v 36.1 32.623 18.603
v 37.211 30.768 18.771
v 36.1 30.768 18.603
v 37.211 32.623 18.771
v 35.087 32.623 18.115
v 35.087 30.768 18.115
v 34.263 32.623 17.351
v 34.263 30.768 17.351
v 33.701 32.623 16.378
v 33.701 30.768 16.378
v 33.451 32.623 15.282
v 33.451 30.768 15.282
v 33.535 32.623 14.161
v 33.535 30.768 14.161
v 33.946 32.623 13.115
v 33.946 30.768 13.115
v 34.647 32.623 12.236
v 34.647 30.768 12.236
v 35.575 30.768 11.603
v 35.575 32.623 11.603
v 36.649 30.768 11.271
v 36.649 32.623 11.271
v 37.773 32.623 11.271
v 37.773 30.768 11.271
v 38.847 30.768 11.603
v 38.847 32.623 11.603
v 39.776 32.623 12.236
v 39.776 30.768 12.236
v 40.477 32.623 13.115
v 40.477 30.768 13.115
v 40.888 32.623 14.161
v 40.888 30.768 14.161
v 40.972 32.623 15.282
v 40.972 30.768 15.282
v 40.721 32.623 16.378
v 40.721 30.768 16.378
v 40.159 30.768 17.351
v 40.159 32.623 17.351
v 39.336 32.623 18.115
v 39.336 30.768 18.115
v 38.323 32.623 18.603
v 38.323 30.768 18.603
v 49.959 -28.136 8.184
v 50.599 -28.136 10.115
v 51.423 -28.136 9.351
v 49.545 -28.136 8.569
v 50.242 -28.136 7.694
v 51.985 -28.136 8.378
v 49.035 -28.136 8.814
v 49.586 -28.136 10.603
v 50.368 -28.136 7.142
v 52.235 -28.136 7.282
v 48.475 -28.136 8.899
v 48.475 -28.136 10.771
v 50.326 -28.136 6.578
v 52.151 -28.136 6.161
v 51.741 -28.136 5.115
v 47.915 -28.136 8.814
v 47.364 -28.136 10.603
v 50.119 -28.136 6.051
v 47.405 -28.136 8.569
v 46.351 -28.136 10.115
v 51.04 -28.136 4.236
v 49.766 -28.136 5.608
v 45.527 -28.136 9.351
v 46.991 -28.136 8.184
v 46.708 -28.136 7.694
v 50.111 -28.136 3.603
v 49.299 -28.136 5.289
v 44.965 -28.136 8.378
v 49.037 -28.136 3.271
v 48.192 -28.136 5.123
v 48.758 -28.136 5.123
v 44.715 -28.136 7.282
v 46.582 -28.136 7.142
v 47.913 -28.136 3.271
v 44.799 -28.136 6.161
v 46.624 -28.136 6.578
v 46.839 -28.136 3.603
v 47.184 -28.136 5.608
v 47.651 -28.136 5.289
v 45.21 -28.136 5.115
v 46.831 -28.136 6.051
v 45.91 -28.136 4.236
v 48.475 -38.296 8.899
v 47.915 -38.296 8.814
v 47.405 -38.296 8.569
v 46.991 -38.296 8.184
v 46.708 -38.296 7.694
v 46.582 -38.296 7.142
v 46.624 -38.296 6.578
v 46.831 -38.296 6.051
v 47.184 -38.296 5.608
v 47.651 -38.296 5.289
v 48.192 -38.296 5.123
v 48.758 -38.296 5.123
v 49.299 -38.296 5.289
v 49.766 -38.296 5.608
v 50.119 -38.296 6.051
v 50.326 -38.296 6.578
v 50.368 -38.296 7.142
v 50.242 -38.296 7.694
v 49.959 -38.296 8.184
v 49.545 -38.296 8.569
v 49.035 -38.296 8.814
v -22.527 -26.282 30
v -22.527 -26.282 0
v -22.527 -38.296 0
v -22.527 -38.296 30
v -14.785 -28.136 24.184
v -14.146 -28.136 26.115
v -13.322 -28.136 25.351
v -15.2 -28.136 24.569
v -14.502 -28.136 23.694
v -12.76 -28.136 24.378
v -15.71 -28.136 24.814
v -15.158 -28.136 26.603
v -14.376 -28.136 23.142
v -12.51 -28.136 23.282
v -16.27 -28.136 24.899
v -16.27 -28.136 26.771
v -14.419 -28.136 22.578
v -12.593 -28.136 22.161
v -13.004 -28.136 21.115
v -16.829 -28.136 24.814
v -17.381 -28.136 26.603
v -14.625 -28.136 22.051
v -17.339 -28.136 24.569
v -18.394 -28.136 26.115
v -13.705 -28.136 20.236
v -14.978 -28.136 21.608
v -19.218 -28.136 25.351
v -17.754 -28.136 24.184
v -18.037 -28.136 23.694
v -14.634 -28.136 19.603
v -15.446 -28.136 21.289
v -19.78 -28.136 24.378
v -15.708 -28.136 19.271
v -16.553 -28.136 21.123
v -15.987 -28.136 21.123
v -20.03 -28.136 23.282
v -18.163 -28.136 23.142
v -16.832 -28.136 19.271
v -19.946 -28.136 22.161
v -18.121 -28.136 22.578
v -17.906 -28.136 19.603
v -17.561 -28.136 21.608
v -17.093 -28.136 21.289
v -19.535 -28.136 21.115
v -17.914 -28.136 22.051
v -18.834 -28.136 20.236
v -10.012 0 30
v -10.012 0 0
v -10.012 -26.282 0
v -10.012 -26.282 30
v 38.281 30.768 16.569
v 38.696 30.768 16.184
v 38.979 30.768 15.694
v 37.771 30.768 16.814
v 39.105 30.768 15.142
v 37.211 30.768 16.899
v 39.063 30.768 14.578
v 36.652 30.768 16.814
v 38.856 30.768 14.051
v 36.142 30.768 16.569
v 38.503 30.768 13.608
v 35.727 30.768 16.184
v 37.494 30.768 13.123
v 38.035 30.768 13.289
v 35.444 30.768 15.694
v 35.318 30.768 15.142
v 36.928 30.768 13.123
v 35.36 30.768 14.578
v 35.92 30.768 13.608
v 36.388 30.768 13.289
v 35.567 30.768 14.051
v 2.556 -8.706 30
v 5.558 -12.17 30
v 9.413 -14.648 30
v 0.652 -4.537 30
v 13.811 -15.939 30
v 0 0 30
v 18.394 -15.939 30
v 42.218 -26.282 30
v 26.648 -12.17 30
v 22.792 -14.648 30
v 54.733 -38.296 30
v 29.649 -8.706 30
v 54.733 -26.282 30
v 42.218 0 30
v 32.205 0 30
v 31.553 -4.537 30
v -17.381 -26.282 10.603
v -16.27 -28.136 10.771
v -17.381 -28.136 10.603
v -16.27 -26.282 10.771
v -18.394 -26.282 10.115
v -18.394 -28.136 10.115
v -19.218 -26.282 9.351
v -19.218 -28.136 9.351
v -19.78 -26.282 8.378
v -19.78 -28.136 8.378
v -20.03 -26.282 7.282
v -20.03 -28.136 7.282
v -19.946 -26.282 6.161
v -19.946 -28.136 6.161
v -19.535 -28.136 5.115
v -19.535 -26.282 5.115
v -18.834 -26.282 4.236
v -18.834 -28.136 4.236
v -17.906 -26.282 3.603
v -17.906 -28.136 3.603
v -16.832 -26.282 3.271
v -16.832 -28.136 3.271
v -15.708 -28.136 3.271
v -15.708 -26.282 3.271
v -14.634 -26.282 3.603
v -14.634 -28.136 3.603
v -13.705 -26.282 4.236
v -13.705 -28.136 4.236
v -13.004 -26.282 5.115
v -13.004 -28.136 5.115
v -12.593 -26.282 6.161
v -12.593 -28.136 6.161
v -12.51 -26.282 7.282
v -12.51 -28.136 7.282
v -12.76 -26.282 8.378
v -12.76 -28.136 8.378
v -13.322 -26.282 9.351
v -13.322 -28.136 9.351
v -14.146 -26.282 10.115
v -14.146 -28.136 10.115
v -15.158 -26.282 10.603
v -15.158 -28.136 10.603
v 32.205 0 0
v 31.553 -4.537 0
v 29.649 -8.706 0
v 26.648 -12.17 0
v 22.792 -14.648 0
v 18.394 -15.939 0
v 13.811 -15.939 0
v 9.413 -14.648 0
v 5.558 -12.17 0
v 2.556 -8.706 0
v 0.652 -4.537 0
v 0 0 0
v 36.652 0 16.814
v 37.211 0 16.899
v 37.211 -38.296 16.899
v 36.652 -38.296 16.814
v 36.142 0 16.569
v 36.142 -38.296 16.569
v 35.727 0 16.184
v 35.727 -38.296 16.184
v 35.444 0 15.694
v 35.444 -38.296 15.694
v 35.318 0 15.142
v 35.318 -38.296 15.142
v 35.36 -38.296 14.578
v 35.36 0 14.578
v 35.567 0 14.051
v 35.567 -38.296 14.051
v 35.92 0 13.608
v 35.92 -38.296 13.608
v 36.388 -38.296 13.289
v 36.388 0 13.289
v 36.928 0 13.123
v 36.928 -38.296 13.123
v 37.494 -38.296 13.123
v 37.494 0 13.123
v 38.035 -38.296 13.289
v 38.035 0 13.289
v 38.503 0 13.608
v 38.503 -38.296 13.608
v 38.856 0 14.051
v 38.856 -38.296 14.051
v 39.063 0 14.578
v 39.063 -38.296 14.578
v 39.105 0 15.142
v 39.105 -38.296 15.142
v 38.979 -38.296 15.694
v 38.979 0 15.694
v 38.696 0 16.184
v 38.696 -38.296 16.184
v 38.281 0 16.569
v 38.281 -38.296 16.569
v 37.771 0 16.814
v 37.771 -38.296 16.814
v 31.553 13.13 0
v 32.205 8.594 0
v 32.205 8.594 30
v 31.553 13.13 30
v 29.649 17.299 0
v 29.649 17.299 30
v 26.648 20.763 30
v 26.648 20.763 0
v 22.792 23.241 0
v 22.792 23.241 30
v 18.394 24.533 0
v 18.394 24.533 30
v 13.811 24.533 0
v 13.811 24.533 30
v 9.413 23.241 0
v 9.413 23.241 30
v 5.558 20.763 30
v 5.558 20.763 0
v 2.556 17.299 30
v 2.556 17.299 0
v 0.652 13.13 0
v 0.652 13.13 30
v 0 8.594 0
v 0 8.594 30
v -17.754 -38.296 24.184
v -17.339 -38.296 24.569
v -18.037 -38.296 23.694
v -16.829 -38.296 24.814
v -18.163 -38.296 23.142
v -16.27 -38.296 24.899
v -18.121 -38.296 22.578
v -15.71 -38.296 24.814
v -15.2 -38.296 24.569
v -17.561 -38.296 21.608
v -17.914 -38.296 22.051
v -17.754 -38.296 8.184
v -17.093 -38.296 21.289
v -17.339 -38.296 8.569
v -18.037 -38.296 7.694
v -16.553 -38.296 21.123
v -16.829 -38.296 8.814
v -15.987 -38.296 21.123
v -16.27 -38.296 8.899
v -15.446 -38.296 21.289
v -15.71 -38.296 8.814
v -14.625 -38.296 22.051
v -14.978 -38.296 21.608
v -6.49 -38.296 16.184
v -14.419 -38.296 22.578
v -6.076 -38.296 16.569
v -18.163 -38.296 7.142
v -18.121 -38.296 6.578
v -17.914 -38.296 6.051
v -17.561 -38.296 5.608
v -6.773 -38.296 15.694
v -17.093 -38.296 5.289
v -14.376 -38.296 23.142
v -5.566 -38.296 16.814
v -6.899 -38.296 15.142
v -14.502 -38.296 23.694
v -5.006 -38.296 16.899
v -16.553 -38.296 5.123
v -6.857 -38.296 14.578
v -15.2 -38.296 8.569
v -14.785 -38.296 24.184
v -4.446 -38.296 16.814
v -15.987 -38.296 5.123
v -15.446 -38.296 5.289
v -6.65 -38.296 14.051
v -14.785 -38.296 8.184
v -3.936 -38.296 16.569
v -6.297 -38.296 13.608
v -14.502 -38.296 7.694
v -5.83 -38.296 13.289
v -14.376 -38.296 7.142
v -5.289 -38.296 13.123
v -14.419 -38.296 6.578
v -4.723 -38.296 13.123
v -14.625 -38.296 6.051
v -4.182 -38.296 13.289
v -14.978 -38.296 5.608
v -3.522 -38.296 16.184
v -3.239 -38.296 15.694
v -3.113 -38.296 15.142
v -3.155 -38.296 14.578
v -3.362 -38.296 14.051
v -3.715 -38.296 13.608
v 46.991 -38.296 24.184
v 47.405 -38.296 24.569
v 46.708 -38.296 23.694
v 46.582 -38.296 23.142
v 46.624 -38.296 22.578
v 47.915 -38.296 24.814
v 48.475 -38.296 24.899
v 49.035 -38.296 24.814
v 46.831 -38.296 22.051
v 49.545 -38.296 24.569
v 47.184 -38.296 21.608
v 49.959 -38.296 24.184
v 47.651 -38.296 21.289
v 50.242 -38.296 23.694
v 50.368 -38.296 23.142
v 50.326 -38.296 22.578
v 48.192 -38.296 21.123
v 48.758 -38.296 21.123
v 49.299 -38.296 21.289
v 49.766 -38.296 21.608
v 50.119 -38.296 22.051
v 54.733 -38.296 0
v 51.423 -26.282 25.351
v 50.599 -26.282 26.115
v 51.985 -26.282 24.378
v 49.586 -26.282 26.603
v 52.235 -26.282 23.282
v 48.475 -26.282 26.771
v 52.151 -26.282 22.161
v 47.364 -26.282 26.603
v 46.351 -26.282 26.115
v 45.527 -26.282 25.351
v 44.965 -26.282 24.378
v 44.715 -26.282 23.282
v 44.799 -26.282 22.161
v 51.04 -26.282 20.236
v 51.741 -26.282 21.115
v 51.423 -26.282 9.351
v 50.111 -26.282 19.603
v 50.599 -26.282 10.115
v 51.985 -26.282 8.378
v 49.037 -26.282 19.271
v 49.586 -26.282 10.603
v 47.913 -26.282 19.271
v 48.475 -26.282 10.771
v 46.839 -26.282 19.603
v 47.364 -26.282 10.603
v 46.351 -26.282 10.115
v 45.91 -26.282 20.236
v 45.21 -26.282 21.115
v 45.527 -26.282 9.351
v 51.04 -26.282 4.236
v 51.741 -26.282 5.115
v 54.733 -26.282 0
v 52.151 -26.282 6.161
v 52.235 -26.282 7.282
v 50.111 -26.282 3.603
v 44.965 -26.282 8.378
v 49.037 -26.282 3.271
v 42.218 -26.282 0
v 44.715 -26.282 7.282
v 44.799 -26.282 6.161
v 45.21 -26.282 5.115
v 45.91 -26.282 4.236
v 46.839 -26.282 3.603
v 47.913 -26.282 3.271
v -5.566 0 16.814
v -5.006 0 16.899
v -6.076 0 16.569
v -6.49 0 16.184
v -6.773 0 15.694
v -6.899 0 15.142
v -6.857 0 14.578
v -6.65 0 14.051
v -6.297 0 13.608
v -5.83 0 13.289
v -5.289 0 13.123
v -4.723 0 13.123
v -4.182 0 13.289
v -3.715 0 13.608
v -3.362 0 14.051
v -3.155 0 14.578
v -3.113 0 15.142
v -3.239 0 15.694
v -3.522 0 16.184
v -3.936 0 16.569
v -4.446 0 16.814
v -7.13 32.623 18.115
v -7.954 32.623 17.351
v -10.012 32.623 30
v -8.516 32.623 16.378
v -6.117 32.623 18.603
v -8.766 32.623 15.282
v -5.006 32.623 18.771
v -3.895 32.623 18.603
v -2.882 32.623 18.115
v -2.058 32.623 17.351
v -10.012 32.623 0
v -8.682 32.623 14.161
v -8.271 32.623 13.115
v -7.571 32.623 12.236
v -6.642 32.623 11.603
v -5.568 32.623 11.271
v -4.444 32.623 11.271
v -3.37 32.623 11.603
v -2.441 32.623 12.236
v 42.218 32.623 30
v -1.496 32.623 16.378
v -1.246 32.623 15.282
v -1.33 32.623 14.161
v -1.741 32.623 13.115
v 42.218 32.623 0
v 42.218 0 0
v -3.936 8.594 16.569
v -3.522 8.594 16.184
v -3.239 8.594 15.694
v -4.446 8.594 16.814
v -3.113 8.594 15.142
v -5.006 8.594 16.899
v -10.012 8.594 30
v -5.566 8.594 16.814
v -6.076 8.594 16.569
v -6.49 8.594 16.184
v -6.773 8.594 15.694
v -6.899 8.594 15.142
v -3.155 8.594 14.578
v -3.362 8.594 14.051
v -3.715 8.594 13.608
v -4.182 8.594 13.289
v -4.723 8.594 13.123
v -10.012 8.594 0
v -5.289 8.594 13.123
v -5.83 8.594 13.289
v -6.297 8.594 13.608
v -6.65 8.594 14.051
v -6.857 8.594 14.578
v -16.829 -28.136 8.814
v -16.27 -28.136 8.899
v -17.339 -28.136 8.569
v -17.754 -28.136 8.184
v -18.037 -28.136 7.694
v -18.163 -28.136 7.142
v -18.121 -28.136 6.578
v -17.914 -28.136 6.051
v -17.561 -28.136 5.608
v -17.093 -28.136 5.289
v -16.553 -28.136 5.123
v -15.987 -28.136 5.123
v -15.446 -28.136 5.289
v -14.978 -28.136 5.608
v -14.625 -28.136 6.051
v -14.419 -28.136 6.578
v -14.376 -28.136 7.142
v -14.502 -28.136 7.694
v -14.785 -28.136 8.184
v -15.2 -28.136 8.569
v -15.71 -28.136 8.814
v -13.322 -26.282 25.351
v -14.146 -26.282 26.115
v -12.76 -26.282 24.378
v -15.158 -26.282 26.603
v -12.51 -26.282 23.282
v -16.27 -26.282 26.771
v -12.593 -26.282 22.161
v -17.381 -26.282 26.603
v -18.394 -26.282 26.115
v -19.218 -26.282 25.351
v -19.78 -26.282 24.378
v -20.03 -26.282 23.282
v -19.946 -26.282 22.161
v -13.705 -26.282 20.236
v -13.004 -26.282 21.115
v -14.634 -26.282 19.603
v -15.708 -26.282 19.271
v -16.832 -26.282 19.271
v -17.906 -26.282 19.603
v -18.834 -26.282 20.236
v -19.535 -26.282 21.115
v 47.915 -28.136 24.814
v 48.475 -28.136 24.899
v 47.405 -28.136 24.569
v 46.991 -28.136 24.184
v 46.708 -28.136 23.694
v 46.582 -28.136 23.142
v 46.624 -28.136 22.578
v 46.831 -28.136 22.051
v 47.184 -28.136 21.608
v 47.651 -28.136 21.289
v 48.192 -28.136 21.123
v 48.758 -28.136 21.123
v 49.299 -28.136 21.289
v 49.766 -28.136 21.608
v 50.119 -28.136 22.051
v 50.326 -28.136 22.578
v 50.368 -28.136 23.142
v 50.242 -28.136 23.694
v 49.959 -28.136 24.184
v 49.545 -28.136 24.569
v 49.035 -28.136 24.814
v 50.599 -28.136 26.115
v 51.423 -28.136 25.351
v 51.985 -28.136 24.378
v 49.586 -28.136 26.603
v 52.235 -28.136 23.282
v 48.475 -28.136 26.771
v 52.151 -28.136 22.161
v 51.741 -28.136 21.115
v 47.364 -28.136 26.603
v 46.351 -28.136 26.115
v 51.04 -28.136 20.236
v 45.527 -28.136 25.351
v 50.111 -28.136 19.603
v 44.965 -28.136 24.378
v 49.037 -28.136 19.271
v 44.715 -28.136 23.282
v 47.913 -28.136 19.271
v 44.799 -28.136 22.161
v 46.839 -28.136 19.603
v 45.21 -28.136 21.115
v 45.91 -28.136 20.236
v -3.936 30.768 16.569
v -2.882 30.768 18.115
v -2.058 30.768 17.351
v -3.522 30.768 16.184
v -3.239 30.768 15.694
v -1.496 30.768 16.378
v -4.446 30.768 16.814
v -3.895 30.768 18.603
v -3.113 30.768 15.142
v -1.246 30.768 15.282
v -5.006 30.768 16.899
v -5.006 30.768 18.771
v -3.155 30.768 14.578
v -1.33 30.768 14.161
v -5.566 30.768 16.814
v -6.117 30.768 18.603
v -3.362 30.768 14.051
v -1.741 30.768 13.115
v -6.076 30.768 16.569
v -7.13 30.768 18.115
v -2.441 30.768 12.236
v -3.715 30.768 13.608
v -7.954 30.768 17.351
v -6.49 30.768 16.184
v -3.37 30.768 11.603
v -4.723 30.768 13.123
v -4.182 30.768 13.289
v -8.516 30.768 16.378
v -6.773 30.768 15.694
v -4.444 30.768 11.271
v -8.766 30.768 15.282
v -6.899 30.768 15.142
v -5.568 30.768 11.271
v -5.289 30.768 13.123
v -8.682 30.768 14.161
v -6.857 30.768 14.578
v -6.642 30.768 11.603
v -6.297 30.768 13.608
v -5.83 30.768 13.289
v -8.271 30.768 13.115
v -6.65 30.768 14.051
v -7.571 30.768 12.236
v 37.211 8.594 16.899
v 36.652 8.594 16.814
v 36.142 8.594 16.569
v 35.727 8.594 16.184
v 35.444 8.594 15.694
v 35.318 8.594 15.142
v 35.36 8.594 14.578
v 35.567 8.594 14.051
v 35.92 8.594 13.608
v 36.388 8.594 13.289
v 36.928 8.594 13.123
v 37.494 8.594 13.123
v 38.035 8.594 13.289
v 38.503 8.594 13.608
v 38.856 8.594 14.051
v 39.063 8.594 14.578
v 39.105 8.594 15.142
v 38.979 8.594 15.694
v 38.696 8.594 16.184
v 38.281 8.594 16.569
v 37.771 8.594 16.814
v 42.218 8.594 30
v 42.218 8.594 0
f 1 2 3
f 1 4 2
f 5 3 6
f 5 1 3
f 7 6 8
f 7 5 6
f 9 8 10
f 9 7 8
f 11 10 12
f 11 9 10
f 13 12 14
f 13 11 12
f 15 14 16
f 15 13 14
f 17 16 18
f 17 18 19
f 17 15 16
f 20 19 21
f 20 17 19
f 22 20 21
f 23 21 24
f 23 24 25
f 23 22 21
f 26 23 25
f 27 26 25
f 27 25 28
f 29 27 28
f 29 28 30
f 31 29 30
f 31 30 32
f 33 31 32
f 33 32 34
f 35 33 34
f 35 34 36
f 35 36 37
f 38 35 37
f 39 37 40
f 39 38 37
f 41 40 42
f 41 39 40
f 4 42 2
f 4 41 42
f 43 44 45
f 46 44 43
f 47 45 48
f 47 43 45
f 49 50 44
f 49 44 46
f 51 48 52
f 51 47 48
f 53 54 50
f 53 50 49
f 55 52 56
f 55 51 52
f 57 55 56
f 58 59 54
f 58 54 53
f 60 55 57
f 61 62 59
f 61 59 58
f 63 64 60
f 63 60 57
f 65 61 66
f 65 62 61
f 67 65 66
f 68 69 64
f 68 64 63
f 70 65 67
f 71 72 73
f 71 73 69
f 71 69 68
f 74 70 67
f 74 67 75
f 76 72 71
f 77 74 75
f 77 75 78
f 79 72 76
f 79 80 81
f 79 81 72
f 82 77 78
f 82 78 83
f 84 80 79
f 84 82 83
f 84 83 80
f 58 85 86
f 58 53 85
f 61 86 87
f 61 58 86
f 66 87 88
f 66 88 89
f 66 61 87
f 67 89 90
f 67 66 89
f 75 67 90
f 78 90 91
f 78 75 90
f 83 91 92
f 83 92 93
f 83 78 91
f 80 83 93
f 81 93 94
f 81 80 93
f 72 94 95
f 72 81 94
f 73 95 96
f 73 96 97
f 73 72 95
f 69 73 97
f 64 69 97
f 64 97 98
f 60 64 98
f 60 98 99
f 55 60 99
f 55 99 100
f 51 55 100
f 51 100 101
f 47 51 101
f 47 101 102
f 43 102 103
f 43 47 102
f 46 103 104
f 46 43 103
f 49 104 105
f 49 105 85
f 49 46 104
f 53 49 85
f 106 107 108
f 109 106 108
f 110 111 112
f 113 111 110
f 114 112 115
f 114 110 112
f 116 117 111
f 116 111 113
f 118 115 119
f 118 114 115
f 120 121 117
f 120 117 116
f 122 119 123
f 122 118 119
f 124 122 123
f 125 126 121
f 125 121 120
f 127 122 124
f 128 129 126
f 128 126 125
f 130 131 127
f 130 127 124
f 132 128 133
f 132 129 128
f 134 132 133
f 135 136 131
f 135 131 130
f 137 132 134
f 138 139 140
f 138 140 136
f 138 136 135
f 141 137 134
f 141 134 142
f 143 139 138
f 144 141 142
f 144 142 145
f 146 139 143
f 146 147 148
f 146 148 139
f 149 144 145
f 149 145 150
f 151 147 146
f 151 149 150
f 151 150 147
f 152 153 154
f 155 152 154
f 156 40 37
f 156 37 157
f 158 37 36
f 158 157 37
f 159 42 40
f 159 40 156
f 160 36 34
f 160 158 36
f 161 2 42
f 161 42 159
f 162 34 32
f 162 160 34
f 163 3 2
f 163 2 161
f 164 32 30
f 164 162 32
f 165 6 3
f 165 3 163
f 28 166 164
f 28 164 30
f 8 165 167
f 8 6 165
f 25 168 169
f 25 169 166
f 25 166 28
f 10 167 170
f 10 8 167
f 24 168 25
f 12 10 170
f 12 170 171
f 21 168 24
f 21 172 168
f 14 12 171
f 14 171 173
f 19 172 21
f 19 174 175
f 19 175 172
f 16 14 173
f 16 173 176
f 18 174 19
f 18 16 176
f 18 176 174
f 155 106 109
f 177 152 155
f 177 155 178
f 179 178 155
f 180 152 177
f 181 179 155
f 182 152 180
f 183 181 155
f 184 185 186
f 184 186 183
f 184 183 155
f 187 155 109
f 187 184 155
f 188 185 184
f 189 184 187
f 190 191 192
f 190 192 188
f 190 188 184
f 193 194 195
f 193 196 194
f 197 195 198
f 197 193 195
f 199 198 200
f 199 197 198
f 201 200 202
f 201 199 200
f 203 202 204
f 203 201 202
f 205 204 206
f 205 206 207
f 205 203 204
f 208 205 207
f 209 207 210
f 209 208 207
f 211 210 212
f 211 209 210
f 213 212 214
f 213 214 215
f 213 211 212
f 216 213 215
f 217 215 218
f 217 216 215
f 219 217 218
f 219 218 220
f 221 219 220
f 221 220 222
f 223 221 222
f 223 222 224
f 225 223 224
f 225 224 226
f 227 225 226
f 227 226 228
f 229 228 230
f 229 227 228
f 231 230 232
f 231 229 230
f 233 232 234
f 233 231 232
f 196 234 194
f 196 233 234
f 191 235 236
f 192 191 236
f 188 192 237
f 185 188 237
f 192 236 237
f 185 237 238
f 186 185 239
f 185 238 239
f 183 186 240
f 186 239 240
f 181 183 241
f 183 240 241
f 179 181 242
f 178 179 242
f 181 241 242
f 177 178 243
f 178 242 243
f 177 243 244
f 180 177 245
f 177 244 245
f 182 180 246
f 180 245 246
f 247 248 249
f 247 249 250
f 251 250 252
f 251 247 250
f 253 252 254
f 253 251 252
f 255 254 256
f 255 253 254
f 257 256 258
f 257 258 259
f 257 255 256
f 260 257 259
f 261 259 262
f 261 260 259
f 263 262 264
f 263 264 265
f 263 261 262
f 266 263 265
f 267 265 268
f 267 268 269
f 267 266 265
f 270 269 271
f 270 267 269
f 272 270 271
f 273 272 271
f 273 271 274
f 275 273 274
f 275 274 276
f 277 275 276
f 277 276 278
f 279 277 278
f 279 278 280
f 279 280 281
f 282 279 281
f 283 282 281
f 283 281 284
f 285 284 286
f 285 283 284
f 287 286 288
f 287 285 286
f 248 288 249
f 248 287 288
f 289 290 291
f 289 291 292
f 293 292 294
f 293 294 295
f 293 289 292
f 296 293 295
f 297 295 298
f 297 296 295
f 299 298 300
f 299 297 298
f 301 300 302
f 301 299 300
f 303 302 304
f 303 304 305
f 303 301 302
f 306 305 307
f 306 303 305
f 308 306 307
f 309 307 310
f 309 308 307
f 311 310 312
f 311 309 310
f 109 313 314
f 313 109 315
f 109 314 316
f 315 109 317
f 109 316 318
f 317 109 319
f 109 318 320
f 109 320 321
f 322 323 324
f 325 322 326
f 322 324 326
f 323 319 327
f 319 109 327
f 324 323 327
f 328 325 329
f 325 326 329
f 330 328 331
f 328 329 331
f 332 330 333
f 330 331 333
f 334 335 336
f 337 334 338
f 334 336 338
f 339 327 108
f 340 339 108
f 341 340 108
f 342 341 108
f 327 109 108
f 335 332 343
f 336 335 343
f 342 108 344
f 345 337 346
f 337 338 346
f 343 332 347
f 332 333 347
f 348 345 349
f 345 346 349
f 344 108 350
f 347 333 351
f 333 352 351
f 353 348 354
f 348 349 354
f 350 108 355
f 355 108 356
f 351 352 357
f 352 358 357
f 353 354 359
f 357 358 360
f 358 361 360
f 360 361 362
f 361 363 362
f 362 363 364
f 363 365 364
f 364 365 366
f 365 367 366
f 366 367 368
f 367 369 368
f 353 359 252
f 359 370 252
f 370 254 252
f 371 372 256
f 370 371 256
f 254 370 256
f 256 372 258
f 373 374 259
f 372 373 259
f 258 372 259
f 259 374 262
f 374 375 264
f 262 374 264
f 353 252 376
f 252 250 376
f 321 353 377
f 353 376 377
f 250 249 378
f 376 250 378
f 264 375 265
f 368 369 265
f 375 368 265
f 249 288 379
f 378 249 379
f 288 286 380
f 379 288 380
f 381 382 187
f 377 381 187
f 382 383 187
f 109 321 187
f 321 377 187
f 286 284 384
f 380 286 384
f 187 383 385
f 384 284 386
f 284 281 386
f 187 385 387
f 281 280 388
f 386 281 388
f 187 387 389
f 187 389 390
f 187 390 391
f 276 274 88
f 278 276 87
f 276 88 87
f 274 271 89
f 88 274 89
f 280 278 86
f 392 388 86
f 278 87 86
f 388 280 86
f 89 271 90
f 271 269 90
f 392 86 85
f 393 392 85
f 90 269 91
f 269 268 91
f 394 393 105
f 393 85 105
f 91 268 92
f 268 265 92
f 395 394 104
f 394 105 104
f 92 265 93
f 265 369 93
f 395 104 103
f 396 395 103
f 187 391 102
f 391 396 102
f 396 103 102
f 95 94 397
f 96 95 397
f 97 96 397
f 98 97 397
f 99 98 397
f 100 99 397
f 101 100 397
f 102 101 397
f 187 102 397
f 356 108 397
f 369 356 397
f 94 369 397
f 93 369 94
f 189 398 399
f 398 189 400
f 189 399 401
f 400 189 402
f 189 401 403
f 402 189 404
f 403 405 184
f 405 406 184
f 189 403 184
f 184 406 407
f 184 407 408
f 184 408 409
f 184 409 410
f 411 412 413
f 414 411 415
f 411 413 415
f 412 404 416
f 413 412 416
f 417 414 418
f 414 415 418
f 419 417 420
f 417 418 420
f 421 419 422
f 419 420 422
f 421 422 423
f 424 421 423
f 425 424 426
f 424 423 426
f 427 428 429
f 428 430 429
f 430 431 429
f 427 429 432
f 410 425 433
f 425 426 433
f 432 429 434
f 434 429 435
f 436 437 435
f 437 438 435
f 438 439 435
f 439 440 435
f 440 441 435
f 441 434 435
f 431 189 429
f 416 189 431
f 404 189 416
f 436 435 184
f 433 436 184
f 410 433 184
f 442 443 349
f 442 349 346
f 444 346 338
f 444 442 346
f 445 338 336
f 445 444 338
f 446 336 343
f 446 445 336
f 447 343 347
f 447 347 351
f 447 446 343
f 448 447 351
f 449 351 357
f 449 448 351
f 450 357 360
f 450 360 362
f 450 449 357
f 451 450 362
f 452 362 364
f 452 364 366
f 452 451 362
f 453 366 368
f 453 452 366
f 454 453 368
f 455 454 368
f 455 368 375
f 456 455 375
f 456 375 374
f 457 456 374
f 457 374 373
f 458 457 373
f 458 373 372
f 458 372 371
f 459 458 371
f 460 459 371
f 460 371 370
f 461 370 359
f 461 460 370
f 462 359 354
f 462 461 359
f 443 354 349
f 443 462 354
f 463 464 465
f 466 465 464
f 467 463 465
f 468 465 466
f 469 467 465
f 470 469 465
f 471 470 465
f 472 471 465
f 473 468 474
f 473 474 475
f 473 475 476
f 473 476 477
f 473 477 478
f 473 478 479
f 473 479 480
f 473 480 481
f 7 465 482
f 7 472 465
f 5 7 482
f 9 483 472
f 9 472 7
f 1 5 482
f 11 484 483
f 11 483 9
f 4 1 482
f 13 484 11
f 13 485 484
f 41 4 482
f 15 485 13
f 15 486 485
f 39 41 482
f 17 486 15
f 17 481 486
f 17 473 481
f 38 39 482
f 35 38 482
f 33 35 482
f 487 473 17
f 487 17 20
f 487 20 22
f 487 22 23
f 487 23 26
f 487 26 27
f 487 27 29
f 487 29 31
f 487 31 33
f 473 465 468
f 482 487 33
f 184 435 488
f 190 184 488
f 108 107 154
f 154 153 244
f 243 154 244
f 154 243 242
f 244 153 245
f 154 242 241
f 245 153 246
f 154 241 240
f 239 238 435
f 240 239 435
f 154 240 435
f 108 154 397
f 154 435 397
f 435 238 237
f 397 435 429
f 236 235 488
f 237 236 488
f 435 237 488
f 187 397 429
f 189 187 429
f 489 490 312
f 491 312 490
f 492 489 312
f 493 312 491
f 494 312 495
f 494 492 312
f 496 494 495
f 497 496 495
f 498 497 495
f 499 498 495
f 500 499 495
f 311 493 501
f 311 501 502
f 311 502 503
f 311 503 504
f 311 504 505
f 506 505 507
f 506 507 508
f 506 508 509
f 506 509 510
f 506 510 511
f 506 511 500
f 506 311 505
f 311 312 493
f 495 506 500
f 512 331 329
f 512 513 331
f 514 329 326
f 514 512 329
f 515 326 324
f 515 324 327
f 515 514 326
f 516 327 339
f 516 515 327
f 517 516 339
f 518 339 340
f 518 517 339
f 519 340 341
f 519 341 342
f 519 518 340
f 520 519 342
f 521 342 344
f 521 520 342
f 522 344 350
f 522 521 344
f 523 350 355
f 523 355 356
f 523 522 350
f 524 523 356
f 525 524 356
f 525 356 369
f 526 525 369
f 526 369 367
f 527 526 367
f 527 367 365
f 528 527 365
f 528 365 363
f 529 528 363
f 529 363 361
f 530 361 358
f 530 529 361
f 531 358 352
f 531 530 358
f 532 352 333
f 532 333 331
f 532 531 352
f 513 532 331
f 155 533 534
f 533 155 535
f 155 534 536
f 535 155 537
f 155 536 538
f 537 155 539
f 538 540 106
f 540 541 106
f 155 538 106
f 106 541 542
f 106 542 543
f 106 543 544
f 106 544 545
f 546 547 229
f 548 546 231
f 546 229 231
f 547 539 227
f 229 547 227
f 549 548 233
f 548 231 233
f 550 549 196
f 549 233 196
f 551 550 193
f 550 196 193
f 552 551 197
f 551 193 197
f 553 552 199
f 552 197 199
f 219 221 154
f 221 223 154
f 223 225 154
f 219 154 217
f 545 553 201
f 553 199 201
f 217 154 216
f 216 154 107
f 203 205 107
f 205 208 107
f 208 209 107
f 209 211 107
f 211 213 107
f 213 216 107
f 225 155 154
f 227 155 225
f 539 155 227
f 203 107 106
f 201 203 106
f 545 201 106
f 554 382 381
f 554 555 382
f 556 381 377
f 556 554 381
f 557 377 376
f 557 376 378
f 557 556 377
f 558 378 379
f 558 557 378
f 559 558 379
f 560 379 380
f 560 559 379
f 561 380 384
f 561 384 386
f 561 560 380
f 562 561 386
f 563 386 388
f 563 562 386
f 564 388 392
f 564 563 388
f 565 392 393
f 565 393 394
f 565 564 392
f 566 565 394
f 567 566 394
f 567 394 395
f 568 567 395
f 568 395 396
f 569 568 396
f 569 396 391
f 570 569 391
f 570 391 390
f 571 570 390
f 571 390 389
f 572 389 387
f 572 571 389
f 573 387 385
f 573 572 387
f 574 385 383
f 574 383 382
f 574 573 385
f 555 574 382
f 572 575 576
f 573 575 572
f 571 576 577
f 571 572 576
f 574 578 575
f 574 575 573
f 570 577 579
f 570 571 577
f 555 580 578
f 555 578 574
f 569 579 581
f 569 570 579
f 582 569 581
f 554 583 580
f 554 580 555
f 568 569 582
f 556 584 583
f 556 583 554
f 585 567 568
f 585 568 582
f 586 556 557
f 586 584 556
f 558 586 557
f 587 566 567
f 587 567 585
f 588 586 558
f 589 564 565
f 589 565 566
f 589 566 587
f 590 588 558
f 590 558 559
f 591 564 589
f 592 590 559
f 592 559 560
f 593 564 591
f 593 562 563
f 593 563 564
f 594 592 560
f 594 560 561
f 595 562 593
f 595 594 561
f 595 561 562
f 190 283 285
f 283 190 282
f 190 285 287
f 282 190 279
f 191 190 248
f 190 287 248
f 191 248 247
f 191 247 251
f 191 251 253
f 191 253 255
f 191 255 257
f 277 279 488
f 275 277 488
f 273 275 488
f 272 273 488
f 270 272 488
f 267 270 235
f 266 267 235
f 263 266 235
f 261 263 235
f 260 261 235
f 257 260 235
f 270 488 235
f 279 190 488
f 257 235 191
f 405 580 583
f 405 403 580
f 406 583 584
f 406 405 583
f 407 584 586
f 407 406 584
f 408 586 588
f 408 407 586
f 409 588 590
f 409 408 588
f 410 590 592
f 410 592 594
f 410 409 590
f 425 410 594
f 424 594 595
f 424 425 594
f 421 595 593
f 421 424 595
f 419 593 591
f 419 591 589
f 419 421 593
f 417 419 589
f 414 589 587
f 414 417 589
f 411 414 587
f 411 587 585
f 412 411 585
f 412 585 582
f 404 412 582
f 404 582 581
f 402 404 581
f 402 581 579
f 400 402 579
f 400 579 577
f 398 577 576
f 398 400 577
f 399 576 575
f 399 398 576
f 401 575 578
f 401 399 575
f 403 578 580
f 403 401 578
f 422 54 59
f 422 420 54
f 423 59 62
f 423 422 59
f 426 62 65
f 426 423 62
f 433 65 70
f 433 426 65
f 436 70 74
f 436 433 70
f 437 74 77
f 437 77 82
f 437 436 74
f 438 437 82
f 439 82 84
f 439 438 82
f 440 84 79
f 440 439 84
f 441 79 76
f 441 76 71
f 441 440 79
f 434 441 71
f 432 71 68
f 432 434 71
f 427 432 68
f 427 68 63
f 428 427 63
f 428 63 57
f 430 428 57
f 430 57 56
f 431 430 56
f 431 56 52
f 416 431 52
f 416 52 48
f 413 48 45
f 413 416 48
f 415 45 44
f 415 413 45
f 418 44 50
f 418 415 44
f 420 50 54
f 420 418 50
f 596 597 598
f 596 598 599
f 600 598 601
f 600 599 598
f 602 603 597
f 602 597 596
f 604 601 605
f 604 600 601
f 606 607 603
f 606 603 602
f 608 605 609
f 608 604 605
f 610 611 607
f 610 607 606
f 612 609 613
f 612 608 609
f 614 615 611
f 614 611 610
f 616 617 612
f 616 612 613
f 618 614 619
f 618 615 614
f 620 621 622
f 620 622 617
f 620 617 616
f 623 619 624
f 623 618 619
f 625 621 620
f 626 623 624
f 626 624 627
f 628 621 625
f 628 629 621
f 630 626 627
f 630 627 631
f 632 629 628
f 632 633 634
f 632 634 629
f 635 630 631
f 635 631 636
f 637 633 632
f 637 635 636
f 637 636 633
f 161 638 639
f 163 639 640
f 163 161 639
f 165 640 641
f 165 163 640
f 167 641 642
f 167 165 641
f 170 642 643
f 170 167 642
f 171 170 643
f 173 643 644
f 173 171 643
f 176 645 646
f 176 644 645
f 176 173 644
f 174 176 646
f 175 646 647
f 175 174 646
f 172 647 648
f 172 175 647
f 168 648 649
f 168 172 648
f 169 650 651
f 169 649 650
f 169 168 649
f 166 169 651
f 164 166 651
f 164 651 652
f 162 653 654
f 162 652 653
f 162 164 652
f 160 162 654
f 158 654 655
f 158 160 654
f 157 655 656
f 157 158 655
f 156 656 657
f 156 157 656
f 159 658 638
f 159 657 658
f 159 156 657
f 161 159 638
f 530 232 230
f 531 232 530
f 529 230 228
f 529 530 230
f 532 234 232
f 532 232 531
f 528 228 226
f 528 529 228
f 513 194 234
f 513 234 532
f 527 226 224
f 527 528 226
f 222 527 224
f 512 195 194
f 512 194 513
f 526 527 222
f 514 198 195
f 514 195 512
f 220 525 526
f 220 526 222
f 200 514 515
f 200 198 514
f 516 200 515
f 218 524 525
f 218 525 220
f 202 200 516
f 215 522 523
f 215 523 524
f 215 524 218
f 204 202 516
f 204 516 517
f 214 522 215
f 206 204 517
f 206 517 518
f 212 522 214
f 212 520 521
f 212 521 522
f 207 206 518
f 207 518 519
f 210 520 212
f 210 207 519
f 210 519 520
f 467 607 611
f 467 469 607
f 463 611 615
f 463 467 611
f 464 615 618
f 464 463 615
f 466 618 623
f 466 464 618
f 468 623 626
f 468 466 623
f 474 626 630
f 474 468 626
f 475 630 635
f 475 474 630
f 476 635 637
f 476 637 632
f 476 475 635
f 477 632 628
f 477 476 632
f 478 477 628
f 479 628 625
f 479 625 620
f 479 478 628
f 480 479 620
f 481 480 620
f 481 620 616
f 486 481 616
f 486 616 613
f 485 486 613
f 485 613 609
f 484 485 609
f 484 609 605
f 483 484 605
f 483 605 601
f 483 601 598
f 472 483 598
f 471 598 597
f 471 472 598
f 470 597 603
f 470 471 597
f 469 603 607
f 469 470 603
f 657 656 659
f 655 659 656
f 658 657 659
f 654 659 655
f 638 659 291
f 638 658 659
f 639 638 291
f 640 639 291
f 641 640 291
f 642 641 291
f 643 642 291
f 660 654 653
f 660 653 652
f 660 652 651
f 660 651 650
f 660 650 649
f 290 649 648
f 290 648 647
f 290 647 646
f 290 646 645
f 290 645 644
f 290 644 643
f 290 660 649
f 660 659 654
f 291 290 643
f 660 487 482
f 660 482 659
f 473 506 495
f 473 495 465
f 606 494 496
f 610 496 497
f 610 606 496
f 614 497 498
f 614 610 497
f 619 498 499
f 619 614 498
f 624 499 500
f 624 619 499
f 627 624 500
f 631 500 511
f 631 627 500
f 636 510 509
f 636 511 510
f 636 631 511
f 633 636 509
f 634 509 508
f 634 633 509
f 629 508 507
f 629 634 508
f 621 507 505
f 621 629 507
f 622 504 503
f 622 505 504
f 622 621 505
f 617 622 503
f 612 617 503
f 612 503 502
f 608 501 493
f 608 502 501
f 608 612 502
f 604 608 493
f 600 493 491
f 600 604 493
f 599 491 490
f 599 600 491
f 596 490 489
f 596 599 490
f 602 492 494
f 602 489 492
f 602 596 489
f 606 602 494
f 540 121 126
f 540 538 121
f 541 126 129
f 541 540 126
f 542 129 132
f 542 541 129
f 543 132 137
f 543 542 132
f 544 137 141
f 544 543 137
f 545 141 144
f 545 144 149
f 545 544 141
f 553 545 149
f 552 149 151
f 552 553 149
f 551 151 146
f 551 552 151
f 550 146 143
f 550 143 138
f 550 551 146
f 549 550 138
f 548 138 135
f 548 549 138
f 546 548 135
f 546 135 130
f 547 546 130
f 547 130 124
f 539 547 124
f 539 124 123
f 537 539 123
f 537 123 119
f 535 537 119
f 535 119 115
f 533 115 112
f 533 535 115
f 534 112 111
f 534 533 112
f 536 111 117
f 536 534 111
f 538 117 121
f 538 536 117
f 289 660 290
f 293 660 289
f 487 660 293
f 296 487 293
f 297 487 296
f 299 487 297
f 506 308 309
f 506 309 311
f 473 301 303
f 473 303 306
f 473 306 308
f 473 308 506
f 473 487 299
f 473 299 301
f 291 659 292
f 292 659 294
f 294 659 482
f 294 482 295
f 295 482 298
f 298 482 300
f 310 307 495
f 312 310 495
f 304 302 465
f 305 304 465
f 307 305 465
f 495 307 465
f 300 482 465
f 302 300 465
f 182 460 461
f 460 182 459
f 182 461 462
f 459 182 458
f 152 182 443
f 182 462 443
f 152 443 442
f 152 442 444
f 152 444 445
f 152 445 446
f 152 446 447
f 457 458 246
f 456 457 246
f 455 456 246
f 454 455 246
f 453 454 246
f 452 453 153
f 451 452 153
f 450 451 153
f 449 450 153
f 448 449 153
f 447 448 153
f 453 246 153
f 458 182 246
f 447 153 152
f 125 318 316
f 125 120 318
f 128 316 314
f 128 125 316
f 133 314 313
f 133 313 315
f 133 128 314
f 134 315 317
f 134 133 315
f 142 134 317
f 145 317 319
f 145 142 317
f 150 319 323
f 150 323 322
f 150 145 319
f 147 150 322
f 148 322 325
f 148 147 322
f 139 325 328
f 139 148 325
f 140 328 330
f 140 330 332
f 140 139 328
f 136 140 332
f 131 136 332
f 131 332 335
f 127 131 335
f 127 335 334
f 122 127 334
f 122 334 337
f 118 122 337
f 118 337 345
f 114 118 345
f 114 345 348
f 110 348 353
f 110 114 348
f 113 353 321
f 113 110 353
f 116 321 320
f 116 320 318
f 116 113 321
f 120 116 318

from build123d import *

# Parameters (mm, degrees)
BOSS_EXTRUDE1_DEPTH                           = 30
BOSS_EXTRUDE1_2_DEPTH                         = 30
CBORE_FOR_6_BUTTON_HEAD_CAP_SCREW1_AT_2_COUNT = 2
CBORE_FOR_6_BUTTON_HEAD_CAP_SCREW1_AT_2_PITCH = 42.21750368
CBORE_FOR_6_BUTTON_HEAD_CAP_SCREW2_AT_2_COUNT = 2
CBORE_FOR_6_BUTTON_HEAD_CAP_SCREW2_AT_2_PITCH = 64.744630149
CBORE_FOR_6_BUTTON_HEAD_CAP_SCREW2_AT_3_COUNT = 2
CBORE_FOR_6_BUTTON_HEAD_CAP_SCREW2_AT_3_PITCH = 66.692331892
CBORE_FOR_6_BUTTON_HEAD_CAP_SCREW2_AT_4_COUNT = 2
CBORE_FOR_6_BUTTON_HEAD_CAP_SCREW2_AT_4_PITCH = 16


with BuildPart() as part:
    # Sketch1 → Boss-Extrude1 (new body)
    with BuildSketch(Plane.XY):
        with BuildLine():
            Line((0, 0), (-10.012056209, 0))
            Line((-10.012056209, 0), (-10.012056209, -26.281647548))
            Line((-10.012056209, -26.281647548), (-22.527126469, -26.281647548))
            Line((-22.527126469, -26.281647548), (-22.527126469, -38.296114998))
            Line((-22.527126469, -38.296114998), (54.73257394, -38.296114998))
            Line((54.73257394, -38.296114998), (54.73257394, -26.281647548))
            Line((54.73257394, -26.281647548), (42.21750368, -26.281647548))
            Line((42.21750368, -26.281647548), (42.21750368, 0))
            Line((42.21750368, 0), (32.205447471, 0))
            ThreePointArc((32.205447471, 0), (16.102723736, -16.102723736), (0, 0))
        make_face()
    extrude(amount=BOSS_EXTRUDE1_DEPTH)


with BuildPart() as body_2:
    # Sketch1 → Boss-Extrude1 2 (new body)
    with BuildSketch(Plane.XY):
        with BuildLine():
            Line((0, 8.593681579), (-10.012056209, 8.593681579))
            Line((-10.012056209, 8.593681579), (-10.012056209, 32.62261648))
            Line((-10.012056209, 32.62261648), (42.21750368, 32.62261648))
            Line((42.21750368, 32.62261648), (42.21750368, 8.593681579))
            Line((42.21750368, 8.593681579), (32.205447471, 8.593681579))
            ThreePointArc((32.205447471, 8.593681579), (16.102723736, 24.696405315), (0, 8.593681579))
        make_face()
    extrude(amount=BOSS_EXTRUDE1_2_DEPTH)


with BuildPart() as cbore_for_6_button_head_cap_screw1_tool:
    # Sketch3 → CBORE for #6 Button Head Cap Screw1 (revolve)
    with BuildSketch(Plane(origin=(37.211475575, 32.62261648, 15), x_dir=(0, 0, 1), z_dir=(1, 0, 0))):
        Polygon((0, 0), (0, 70.918731478), (1.89865, 70.918731478), (1.89865, 1.8542), (3.77063, 1.8542), (3.77063, 0), align=None)
    cbore_for_6_button_head_cap_screw1 = revolve(axis=Axis((37.211475575, 38.97261648, 15), (0, -1, 0)))


with BuildPart() as part_1:
    add(part.part)

    # CBORE for #6 Button Head Cap Screw1: cut by cbore_for_6_button_head_cap_screw1_tool
    add(cbore_for_6_button_head_cap_screw1_tool.part, mode=Mode.SUBTRACT)


with BuildPart() as body_2_1:
    add(body_2.part)

    # CBORE for #6 Button Head Cap Screw1: cut by cbore_for_6_button_head_cap_screw1_tool
    add(cbore_for_6_button_head_cap_screw1_tool.part, mode=Mode.SUBTRACT)


with BuildPart() as cbore_for_6_button_head_cap_screw1_at_2_tool:
    # CBORE for #6 Button Head Cap Screw1 at 2: CBORE for #6 Button Head Cap Screw1 ×2
    with Locations(*[(-i * CBORE_FOR_6_BUTTON_HEAD_CAP_SCREW1_AT_2_PITCH, 0, 0) for i in range(1, CBORE_FOR_6_BUTTON_HEAD_CAP_SCREW1_AT_2_COUNT)]):
        add(cbore_for_6_button_head_cap_screw1)


with BuildPart() as part_2:
    add(part_1.part)

    # CBORE for #6 Button Head Cap Screw1 at 2: cut by cbore_for_6_button_head_cap_screw1_at_2_tool
    add(cbore_for_6_button_head_cap_screw1_at_2_tool.part, mode=Mode.SUBTRACT)

    # Sketch5 → CBORE for #6 Button Head Cap Screw2 (revolve, cut)
    with BuildSketch(Plane(origin=(48.47503881, -26.281647548, 7), x_dir=(0, 0, 1), z_dir=(1, 0, 0))):
        Polygon((0, 0), (0, 12.01446745), (1.89865, 12.01446745), (1.89865, 1.8542), (3.77063, 1.8542), (3.77063, 0), align=None)
    cbore_for_6_button_head_cap_screw2 = revolve(axis=Axis((48.47503881, -19.931647548, 7), (0, -1, 0)), mode=Mode.SUBTRACT)

    # CBORE for #6 Button Head Cap Screw2 at 2: CBORE for #6 Button Head Cap Screw2 ×2
    with Locations(*[(-i * CBORE_FOR_6_BUTTON_HEAD_CAP_SCREW2_AT_2_PITCH, 0, 0) for i in range(1, CBORE_FOR_6_BUTTON_HEAD_CAP_SCREW2_AT_2_COUNT)]):
        add(cbore_for_6_button_head_cap_screw2, mode=Mode.SUBTRACT)

    # CBORE for #6 Button Head Cap Screw2 at 3: CBORE for #6 Button Head Cap Screw2 ×2
    with Locations(*[Vector(-0.970795717, 0, 0.239907641) * (i * CBORE_FOR_6_BUTTON_HEAD_CAP_SCREW2_AT_3_PITCH) for i in range(1, CBORE_FOR_6_BUTTON_HEAD_CAP_SCREW2_AT_3_COUNT)]):
        add(cbore_for_6_button_head_cap_screw2, mode=Mode.SUBTRACT)

    # CBORE for #6 Button Head Cap Screw2 at 4: CBORE for #6 Button Head Cap Screw2 ×2
    with Locations(*[(0, 0, i * CBORE_FOR_6_BUTTON_HEAD_CAP_SCREW2_AT_4_PITCH) for i in range(1, CBORE_FOR_6_BUTTON_HEAD_CAP_SCREW2_AT_4_COUNT)]):
        add(cbore_for_6_button_head_cap_screw2, mode=Mode.SUBTRACT)


with BuildPart() as body_2_2:
    add(body_2_1.part)

    # CBORE for #6 Button Head Cap Screw1 at 2: cut by cbore_for_6_button_head_cap_screw1_at_2_tool
    add(cbore_for_6_button_head_cap_screw1_at_2_tool.part, mode=Mode.SUBTRACT)


solid = Compound([part_2.part, body_2_2.part])
